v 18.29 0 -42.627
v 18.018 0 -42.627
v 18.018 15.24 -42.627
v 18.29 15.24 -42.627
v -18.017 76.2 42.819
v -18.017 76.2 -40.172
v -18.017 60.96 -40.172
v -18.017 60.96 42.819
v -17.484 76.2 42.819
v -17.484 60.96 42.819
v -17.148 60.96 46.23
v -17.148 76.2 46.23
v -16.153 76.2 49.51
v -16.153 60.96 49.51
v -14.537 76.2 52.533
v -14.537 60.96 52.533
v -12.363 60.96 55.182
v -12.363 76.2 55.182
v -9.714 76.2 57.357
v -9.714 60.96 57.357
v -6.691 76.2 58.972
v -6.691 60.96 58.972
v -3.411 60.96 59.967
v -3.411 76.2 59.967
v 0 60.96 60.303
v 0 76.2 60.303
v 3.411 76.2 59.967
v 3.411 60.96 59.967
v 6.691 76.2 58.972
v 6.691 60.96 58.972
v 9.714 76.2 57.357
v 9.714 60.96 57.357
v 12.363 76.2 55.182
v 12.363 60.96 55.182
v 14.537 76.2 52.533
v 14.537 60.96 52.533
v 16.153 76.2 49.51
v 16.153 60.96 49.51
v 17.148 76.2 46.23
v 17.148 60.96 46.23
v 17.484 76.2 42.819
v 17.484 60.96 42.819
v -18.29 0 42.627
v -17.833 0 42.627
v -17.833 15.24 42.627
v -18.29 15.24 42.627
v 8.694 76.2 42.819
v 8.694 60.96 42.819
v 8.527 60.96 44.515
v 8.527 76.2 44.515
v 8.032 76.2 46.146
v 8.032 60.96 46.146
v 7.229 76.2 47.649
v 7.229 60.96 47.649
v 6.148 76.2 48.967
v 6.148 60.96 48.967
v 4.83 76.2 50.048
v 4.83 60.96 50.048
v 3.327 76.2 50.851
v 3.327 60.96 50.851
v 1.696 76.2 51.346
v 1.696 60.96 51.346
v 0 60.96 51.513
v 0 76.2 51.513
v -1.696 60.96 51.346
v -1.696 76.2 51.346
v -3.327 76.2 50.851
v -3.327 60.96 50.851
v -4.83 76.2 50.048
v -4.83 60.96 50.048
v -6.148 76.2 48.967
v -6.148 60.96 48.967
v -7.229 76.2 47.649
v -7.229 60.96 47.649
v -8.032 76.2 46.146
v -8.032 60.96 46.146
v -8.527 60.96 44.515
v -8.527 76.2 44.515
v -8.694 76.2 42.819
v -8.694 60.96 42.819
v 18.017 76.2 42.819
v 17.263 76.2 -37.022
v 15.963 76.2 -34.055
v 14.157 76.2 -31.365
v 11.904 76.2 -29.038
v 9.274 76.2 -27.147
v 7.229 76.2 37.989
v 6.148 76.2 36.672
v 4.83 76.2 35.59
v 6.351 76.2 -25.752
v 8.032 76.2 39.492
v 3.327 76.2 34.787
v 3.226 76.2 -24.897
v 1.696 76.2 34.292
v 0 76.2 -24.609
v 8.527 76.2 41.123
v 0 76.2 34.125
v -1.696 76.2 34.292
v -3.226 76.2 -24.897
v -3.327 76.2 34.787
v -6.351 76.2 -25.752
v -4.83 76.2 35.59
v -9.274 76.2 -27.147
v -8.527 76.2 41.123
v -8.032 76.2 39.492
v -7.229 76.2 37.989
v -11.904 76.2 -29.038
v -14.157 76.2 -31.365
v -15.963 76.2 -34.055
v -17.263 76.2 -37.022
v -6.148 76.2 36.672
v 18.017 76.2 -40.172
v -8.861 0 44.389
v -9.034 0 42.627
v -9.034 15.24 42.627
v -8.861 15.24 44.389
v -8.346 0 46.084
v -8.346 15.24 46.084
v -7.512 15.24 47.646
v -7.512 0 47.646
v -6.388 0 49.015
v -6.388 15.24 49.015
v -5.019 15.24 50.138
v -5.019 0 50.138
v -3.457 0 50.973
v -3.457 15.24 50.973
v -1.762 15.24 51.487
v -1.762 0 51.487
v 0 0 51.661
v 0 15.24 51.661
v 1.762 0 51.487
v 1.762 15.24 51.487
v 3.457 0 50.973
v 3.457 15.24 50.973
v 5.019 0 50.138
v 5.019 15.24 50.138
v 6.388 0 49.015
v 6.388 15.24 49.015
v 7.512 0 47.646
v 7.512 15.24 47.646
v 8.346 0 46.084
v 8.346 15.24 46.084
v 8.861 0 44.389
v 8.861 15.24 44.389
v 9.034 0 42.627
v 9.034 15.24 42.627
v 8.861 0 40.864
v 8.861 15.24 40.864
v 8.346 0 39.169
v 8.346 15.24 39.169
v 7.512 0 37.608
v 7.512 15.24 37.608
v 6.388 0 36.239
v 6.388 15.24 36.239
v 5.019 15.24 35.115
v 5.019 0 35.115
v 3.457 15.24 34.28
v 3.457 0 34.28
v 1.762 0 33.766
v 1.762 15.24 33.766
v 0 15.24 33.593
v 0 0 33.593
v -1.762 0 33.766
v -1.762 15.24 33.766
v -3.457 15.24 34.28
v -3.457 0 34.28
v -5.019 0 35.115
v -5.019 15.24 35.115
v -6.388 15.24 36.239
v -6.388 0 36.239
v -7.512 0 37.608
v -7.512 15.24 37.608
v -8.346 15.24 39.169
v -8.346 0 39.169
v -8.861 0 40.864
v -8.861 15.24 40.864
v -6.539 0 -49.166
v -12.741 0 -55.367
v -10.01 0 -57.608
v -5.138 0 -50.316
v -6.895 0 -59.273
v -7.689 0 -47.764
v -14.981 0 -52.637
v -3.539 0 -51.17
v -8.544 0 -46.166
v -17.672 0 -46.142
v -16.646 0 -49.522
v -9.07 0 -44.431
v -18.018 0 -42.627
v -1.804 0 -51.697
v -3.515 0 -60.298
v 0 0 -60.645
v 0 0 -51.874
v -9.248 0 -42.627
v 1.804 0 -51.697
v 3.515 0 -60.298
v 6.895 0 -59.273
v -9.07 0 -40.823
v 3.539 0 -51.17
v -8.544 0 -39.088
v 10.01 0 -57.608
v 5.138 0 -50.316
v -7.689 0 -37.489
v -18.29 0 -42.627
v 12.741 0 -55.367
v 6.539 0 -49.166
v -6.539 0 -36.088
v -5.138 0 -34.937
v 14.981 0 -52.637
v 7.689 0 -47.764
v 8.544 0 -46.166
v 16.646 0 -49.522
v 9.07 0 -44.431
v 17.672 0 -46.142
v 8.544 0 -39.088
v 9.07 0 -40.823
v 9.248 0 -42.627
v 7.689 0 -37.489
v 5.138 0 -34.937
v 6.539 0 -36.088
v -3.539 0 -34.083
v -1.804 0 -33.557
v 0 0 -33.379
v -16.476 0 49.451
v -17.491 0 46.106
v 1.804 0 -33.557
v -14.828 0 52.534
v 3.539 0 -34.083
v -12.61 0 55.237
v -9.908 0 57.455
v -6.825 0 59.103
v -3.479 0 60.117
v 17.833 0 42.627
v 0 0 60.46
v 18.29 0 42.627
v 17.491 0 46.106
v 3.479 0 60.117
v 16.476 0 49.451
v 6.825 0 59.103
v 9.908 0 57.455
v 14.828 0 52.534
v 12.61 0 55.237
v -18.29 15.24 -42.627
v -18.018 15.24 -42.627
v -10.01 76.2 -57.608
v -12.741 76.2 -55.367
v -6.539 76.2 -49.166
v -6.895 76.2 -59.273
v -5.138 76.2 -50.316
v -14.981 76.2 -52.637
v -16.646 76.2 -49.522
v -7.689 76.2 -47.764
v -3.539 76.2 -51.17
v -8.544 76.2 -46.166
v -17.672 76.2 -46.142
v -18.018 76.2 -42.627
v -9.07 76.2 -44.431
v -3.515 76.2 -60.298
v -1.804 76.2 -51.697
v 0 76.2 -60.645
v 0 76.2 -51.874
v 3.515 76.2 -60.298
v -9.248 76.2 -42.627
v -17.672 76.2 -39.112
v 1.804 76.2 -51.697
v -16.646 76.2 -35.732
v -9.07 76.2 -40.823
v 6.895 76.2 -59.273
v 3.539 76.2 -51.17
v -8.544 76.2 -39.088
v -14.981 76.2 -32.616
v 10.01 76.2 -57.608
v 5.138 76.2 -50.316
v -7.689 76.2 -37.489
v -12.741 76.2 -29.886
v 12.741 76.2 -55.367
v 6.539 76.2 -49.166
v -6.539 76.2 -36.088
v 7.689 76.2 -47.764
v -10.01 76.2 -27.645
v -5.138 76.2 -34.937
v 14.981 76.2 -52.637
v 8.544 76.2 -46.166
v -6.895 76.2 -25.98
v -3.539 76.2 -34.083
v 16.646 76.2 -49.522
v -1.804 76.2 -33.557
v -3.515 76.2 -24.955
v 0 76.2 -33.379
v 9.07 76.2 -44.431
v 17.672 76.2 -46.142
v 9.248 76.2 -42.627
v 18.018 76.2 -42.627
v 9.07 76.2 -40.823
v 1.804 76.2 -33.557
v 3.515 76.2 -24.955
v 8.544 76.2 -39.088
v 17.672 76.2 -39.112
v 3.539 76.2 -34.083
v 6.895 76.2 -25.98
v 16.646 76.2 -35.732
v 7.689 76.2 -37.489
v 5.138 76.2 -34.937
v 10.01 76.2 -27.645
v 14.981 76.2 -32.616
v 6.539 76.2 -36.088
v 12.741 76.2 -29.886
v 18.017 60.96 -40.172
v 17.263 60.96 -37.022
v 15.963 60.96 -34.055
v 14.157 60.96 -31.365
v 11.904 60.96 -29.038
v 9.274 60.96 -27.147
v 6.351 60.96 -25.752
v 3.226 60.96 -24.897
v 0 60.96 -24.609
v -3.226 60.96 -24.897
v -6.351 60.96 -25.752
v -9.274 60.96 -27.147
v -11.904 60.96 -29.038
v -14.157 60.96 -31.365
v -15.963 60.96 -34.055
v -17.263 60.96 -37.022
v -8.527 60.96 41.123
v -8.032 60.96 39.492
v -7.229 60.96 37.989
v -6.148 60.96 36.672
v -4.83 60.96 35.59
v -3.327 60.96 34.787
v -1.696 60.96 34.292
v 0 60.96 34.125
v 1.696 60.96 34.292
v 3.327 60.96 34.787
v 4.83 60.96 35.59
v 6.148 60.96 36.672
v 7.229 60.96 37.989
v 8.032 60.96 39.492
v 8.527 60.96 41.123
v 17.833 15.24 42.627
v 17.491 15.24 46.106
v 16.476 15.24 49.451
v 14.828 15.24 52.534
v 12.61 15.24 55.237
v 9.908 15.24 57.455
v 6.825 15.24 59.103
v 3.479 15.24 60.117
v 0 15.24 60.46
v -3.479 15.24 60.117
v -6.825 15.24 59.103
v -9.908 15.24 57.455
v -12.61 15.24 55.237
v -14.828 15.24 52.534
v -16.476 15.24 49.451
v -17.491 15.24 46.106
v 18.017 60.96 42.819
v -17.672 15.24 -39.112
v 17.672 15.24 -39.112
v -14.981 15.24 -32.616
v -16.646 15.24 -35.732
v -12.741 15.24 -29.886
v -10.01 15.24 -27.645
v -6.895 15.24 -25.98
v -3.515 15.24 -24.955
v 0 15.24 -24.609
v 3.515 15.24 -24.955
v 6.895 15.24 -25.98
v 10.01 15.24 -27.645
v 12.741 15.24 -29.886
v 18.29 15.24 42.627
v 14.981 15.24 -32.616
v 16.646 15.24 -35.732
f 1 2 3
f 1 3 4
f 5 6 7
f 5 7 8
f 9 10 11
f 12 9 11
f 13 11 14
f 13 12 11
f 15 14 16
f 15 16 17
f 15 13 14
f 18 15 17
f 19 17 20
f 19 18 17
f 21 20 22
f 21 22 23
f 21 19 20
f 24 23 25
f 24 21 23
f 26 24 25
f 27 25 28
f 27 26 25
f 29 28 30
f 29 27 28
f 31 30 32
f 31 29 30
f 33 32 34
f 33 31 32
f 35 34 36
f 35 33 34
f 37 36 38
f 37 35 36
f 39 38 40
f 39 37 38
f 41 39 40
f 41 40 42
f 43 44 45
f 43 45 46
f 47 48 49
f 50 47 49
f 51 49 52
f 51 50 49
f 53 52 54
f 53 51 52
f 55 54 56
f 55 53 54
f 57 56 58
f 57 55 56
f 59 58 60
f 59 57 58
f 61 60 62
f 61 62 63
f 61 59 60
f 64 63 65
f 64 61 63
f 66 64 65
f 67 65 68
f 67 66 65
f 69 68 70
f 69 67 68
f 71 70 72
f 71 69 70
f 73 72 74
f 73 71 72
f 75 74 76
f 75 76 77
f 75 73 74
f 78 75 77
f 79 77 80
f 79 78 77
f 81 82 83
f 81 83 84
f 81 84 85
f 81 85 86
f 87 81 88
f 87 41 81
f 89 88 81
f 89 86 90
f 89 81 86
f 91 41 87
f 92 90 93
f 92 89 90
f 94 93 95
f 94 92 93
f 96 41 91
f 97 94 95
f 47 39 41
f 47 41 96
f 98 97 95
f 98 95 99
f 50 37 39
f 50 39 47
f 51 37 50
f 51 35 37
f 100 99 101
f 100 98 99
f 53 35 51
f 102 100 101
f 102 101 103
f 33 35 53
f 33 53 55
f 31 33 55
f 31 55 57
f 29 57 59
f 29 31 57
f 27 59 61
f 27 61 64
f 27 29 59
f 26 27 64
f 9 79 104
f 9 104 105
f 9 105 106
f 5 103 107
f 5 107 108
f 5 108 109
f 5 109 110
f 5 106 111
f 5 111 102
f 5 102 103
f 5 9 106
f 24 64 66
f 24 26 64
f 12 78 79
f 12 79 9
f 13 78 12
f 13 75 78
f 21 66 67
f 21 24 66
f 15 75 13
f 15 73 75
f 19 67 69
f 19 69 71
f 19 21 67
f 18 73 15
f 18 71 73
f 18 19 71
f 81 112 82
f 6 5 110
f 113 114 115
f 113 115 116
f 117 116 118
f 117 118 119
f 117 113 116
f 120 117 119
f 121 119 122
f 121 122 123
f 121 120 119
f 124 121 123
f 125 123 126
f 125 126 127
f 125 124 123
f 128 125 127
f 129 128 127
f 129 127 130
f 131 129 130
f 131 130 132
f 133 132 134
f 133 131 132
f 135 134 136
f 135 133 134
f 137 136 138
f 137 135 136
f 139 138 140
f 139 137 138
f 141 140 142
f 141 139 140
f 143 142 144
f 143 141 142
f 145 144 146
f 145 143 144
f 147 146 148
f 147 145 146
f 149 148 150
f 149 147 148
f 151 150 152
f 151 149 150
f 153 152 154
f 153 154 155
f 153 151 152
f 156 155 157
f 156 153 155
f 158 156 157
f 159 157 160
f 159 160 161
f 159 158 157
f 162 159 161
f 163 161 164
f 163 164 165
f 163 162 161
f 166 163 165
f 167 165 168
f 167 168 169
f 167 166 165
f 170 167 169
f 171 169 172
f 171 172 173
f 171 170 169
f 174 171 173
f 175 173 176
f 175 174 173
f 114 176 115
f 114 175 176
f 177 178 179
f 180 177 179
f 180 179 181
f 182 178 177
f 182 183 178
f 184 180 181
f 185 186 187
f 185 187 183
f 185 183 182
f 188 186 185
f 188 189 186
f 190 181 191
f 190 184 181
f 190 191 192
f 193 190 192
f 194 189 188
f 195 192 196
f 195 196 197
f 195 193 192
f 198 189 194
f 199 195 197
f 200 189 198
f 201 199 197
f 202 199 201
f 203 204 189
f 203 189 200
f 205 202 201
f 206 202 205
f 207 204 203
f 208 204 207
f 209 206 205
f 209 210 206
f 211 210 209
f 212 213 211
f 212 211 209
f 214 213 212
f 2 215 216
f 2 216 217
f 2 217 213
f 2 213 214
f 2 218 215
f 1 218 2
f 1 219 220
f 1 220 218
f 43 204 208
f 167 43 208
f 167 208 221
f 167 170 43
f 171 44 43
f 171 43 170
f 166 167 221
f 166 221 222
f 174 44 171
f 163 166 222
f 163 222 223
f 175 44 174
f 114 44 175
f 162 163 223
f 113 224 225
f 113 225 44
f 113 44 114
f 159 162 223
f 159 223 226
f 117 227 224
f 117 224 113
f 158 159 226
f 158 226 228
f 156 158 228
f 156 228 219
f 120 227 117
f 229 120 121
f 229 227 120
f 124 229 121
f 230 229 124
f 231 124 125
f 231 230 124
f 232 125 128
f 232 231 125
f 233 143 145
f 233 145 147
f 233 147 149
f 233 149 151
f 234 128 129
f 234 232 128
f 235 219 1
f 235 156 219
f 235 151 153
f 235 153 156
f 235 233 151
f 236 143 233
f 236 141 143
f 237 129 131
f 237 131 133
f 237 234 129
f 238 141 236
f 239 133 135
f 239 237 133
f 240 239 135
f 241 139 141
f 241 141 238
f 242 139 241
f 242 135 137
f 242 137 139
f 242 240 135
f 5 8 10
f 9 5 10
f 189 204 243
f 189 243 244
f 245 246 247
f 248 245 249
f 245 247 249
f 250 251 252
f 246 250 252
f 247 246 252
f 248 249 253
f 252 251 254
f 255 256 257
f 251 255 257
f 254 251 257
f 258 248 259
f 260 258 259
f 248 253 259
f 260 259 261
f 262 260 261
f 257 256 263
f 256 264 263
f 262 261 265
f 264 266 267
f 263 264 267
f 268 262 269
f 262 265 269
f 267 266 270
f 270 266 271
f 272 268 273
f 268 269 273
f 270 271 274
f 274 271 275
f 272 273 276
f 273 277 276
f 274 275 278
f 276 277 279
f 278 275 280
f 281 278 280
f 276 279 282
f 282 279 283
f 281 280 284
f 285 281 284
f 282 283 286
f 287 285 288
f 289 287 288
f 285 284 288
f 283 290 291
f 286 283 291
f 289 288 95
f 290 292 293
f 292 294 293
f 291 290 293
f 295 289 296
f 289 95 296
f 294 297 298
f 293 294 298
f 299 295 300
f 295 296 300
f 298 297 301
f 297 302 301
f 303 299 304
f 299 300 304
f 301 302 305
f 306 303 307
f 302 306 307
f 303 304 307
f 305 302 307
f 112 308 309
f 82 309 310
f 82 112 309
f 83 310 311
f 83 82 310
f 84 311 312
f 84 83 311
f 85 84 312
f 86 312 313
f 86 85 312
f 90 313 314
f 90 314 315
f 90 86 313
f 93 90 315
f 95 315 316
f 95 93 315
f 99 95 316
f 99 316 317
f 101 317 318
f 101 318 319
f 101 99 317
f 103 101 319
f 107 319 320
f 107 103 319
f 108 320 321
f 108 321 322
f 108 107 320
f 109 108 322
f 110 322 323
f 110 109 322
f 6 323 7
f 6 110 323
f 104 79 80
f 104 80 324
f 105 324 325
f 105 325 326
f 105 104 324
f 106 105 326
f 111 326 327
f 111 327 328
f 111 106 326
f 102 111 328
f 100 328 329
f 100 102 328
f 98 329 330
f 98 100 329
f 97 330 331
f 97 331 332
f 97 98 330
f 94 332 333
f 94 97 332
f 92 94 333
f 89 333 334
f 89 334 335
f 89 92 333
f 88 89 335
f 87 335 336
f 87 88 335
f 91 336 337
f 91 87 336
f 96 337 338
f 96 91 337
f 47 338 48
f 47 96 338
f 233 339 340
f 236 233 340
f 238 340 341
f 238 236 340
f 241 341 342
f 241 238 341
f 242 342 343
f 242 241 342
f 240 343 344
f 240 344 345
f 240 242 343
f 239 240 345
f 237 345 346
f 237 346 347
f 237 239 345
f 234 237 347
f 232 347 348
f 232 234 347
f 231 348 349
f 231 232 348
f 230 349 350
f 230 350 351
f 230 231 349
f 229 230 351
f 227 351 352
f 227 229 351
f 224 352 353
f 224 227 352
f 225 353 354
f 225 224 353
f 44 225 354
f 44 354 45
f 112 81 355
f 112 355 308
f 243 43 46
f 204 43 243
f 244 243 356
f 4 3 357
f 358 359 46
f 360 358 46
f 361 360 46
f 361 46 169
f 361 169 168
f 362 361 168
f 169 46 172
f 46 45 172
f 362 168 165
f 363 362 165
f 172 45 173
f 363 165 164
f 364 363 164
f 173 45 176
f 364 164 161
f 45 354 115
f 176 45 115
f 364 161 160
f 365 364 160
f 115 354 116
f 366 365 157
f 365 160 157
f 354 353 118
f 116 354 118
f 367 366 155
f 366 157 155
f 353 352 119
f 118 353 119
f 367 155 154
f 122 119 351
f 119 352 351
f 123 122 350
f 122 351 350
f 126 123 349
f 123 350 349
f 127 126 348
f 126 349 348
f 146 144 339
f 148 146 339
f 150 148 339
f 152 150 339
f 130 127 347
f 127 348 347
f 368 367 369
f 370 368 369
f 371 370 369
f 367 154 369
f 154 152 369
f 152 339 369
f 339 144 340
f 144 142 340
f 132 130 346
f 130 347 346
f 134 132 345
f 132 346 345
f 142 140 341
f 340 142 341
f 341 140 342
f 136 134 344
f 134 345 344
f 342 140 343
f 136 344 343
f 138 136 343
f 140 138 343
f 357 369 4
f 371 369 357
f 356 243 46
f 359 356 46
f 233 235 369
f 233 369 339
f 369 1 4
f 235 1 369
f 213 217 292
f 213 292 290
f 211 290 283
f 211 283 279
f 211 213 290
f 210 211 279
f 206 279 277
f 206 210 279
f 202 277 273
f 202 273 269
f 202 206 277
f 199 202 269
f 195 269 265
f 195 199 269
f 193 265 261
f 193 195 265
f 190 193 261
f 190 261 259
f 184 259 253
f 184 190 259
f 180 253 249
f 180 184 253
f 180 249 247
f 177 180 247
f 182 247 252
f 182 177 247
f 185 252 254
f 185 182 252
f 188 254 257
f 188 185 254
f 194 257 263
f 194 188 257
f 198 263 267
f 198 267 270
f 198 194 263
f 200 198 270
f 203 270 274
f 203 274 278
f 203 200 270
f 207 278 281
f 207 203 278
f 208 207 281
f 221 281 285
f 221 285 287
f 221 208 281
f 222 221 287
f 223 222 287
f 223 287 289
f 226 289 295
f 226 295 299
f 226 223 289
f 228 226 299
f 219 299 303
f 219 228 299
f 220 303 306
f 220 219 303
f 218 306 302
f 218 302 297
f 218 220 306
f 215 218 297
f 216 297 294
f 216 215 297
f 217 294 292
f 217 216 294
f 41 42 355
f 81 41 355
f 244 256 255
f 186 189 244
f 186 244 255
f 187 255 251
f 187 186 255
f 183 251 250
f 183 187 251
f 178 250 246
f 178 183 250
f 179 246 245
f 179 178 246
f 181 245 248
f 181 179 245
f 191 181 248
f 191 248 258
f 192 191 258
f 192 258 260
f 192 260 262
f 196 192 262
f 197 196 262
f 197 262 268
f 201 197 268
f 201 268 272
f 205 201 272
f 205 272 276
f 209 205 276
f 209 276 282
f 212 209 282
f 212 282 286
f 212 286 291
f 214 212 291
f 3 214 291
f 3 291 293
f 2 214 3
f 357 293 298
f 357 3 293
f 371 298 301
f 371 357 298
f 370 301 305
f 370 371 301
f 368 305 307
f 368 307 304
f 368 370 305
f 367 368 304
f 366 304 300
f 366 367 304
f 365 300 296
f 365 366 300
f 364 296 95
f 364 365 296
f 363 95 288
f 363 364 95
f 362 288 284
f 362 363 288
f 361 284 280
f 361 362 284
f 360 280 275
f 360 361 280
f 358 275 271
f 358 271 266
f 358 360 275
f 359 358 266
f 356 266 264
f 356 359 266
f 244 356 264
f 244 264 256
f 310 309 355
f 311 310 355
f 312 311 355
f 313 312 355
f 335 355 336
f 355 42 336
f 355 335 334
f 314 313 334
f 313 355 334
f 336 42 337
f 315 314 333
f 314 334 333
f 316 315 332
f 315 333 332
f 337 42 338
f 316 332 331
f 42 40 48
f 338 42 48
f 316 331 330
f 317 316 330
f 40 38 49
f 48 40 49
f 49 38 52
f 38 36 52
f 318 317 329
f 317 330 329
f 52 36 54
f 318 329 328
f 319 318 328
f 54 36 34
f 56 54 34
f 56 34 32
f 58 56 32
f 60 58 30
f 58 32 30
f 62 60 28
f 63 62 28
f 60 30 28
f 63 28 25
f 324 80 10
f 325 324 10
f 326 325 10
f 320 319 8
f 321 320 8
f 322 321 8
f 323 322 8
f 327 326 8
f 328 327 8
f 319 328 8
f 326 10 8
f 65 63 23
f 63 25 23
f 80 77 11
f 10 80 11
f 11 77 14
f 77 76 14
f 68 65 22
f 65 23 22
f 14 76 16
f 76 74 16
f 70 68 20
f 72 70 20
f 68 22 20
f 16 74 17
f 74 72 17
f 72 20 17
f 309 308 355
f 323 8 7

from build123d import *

# Parameters (mm, degrees)
F1_DEPTH = 76.2
F2_DEPTH = 15.24
F4_DEPTH = 15.24


with BuildPart() as f1:
    # F0 (on Front) → F1 (new body)
    with BuildSketch(Plane.XZ):
        with BuildLine():
            Line((9.2477568342, -42.6266789436), (18.0179582056, -42.6266789436))
            ThreePointArc((18.0179582056, -42.6266789436), (0, -24.608720738), (-18.0179582056, -42.6266789436))
            Line((-18.0179582056, -42.6266789436), (-9.2477568342, -42.6266789436))
            ThreePointArc((-9.2477568342, -42.6266789436), (0, -33.3789221094), (9.2477568342, -42.6266789436))
        make_face()
        with BuildLine():
            ThreePointArc((-18.0179582056, -42.6266789436), (0, -60.6446371492), (18.0179582056, -42.6266789436))
            Line((18.0179582056, -42.6266789436), (9.2477568342, -42.6266789436))
            ThreePointArc((9.2477568342, -42.6266789436), (0, -51.8744357778), (-9.2477568342, -42.6266789436))
            Line((-9.2477568342, -42.6266789436), (-18.0179582056, -42.6266789436))
        make_face()
    extrude(amount=-F1_DEPTH)

    # F0 (on Front) → F2 (join)
    with BuildSketch(Plane.XZ):
        with BuildLine():
            Line((18.0179582056, -42.6266789436), (18.2895697653, -42.6266789436))
            Line((18.2895697653, -42.6266789436), (18.2895697653, 42.6266789436))
            Line((18.2895697653, 42.6266789436), (17.8333127856, 42.6266789436))
            ThreePointArc((17.8333127856, 42.6266789436), (0, 24.793366158), (-17.8333127856, 42.6266789436))
            Line((-17.8333127856, 42.6266789436), (-18.2895697653, 42.6266789436))
            Line((-18.2895697653, 42.6266789436), (-18.2895697653, -42.6266789436))
            Line((-18.2895697653, -42.6266789436), (-18.0179582056, -42.6266789436))
            ThreePointArc((-18.0179582056, -42.6266789436), (0, -24.608720738), (18.0179582056, -42.6266789436))
        make_face()
        with BuildLine():
            Line((9.0340918857, 42.6266789436), (17.8333127856, 42.6266789436))
            ThreePointArc((17.8333127856, 42.6266789436), (0, 60.4599917292), (-17.8333127856, 42.6266789436))
            Line((-17.8333127856, 42.6266789436), (-9.0340918857, 42.6266789436))
            ThreePointArc((-9.0340918857, 42.6266789436), (0, 51.6607708293), (9.0340918857, 42.6266789436))
        make_face()
        with BuildLine():
            ThreePointArc((-17.8333127856, 42.6266789436), (0, 24.793366158), (17.8333127856, 42.6266789436))
            Line((17.8333127856, 42.6266789436), (9.0340918857, 42.6266789436))
            ThreePointArc((9.0340918857, 42.6266789436), (0, 33.5925870579), (-9.0340918857, 42.6266789436))
            Line((-9.0340918857, 42.6266789436), (-17.8333127856, 42.6266789436))
        make_face()
    extrude(amount=-F2_DEPTH)


with BuildPart() as f4:
    # F3 (on face) → F4 (new body)
    with BuildSketch(Plane(origin=(0, 76.2, 0), x_dir=(-1, 0, 0), z_dir=(0, 1, 0))):
        with BuildLine():
            ThreePointArc((-17.4840441192, 42.8191055285), (0, 25.3350614092), (17.4840441192, 42.8191055285))
            Line((17.4840441192, 42.8191055285), (8.6940024007, 42.8191055285))
            ThreePointArc((8.6940024007, 42.8191055285), (0, 34.1251031278), (-8.6940024007, 42.8191055285))
            Line((-8.6940024007, 42.8191055285), (-17.4840441192, 42.8191055285))
        make_face()
        with BuildLine():
            Line((8.6940024007, 42.8191055285), (17.4840441192, 42.8191055285))
            ThreePointArc((17.4840441192, 42.8191055285), (0, 60.3031496477), (-17.4840441192, 42.8191055285))
            Line((-17.4840441192, 42.8191055285), (-8.6940024007, 42.8191055285))
            ThreePointArc((-8.6940024007, 42.8191055285), (0, 51.5131079291), (8.6940024007, 42.8191055285))
        make_face()
        with BuildLine():
            ThreePointArc((-7.63e-08, -24.608720738), (11.9039767373, -29.0381965579), (18.0169306462, -40.1717815387))
            Line((18.0169306462, -40.1717815387), (18.0169306462, 42.8191055285))
            Line((18.0169306462, 42.8191055285), (17.4840441192, 42.8191055285))
            ThreePointArc((17.4840441192, 42.8191055285), (0, 25.3350614092), (-17.4840441192, 42.8191055285))
            Line((-17.4840441192, 42.8191055285), (-18.0169306462, 42.8191055285))
            Line((-18.0169306462, 42.8191055285), (-18.0169306462, -40.1717815387))
            ThreePointArc((-18.0169306462, -40.1717815387), (-11.903976795, -29.0381966078), (-7.63e-08, -24.608720738))
        make_face()
    extrude(amount=-F4_DEPTH)


solid = Compound([f1.part, f4.part])
